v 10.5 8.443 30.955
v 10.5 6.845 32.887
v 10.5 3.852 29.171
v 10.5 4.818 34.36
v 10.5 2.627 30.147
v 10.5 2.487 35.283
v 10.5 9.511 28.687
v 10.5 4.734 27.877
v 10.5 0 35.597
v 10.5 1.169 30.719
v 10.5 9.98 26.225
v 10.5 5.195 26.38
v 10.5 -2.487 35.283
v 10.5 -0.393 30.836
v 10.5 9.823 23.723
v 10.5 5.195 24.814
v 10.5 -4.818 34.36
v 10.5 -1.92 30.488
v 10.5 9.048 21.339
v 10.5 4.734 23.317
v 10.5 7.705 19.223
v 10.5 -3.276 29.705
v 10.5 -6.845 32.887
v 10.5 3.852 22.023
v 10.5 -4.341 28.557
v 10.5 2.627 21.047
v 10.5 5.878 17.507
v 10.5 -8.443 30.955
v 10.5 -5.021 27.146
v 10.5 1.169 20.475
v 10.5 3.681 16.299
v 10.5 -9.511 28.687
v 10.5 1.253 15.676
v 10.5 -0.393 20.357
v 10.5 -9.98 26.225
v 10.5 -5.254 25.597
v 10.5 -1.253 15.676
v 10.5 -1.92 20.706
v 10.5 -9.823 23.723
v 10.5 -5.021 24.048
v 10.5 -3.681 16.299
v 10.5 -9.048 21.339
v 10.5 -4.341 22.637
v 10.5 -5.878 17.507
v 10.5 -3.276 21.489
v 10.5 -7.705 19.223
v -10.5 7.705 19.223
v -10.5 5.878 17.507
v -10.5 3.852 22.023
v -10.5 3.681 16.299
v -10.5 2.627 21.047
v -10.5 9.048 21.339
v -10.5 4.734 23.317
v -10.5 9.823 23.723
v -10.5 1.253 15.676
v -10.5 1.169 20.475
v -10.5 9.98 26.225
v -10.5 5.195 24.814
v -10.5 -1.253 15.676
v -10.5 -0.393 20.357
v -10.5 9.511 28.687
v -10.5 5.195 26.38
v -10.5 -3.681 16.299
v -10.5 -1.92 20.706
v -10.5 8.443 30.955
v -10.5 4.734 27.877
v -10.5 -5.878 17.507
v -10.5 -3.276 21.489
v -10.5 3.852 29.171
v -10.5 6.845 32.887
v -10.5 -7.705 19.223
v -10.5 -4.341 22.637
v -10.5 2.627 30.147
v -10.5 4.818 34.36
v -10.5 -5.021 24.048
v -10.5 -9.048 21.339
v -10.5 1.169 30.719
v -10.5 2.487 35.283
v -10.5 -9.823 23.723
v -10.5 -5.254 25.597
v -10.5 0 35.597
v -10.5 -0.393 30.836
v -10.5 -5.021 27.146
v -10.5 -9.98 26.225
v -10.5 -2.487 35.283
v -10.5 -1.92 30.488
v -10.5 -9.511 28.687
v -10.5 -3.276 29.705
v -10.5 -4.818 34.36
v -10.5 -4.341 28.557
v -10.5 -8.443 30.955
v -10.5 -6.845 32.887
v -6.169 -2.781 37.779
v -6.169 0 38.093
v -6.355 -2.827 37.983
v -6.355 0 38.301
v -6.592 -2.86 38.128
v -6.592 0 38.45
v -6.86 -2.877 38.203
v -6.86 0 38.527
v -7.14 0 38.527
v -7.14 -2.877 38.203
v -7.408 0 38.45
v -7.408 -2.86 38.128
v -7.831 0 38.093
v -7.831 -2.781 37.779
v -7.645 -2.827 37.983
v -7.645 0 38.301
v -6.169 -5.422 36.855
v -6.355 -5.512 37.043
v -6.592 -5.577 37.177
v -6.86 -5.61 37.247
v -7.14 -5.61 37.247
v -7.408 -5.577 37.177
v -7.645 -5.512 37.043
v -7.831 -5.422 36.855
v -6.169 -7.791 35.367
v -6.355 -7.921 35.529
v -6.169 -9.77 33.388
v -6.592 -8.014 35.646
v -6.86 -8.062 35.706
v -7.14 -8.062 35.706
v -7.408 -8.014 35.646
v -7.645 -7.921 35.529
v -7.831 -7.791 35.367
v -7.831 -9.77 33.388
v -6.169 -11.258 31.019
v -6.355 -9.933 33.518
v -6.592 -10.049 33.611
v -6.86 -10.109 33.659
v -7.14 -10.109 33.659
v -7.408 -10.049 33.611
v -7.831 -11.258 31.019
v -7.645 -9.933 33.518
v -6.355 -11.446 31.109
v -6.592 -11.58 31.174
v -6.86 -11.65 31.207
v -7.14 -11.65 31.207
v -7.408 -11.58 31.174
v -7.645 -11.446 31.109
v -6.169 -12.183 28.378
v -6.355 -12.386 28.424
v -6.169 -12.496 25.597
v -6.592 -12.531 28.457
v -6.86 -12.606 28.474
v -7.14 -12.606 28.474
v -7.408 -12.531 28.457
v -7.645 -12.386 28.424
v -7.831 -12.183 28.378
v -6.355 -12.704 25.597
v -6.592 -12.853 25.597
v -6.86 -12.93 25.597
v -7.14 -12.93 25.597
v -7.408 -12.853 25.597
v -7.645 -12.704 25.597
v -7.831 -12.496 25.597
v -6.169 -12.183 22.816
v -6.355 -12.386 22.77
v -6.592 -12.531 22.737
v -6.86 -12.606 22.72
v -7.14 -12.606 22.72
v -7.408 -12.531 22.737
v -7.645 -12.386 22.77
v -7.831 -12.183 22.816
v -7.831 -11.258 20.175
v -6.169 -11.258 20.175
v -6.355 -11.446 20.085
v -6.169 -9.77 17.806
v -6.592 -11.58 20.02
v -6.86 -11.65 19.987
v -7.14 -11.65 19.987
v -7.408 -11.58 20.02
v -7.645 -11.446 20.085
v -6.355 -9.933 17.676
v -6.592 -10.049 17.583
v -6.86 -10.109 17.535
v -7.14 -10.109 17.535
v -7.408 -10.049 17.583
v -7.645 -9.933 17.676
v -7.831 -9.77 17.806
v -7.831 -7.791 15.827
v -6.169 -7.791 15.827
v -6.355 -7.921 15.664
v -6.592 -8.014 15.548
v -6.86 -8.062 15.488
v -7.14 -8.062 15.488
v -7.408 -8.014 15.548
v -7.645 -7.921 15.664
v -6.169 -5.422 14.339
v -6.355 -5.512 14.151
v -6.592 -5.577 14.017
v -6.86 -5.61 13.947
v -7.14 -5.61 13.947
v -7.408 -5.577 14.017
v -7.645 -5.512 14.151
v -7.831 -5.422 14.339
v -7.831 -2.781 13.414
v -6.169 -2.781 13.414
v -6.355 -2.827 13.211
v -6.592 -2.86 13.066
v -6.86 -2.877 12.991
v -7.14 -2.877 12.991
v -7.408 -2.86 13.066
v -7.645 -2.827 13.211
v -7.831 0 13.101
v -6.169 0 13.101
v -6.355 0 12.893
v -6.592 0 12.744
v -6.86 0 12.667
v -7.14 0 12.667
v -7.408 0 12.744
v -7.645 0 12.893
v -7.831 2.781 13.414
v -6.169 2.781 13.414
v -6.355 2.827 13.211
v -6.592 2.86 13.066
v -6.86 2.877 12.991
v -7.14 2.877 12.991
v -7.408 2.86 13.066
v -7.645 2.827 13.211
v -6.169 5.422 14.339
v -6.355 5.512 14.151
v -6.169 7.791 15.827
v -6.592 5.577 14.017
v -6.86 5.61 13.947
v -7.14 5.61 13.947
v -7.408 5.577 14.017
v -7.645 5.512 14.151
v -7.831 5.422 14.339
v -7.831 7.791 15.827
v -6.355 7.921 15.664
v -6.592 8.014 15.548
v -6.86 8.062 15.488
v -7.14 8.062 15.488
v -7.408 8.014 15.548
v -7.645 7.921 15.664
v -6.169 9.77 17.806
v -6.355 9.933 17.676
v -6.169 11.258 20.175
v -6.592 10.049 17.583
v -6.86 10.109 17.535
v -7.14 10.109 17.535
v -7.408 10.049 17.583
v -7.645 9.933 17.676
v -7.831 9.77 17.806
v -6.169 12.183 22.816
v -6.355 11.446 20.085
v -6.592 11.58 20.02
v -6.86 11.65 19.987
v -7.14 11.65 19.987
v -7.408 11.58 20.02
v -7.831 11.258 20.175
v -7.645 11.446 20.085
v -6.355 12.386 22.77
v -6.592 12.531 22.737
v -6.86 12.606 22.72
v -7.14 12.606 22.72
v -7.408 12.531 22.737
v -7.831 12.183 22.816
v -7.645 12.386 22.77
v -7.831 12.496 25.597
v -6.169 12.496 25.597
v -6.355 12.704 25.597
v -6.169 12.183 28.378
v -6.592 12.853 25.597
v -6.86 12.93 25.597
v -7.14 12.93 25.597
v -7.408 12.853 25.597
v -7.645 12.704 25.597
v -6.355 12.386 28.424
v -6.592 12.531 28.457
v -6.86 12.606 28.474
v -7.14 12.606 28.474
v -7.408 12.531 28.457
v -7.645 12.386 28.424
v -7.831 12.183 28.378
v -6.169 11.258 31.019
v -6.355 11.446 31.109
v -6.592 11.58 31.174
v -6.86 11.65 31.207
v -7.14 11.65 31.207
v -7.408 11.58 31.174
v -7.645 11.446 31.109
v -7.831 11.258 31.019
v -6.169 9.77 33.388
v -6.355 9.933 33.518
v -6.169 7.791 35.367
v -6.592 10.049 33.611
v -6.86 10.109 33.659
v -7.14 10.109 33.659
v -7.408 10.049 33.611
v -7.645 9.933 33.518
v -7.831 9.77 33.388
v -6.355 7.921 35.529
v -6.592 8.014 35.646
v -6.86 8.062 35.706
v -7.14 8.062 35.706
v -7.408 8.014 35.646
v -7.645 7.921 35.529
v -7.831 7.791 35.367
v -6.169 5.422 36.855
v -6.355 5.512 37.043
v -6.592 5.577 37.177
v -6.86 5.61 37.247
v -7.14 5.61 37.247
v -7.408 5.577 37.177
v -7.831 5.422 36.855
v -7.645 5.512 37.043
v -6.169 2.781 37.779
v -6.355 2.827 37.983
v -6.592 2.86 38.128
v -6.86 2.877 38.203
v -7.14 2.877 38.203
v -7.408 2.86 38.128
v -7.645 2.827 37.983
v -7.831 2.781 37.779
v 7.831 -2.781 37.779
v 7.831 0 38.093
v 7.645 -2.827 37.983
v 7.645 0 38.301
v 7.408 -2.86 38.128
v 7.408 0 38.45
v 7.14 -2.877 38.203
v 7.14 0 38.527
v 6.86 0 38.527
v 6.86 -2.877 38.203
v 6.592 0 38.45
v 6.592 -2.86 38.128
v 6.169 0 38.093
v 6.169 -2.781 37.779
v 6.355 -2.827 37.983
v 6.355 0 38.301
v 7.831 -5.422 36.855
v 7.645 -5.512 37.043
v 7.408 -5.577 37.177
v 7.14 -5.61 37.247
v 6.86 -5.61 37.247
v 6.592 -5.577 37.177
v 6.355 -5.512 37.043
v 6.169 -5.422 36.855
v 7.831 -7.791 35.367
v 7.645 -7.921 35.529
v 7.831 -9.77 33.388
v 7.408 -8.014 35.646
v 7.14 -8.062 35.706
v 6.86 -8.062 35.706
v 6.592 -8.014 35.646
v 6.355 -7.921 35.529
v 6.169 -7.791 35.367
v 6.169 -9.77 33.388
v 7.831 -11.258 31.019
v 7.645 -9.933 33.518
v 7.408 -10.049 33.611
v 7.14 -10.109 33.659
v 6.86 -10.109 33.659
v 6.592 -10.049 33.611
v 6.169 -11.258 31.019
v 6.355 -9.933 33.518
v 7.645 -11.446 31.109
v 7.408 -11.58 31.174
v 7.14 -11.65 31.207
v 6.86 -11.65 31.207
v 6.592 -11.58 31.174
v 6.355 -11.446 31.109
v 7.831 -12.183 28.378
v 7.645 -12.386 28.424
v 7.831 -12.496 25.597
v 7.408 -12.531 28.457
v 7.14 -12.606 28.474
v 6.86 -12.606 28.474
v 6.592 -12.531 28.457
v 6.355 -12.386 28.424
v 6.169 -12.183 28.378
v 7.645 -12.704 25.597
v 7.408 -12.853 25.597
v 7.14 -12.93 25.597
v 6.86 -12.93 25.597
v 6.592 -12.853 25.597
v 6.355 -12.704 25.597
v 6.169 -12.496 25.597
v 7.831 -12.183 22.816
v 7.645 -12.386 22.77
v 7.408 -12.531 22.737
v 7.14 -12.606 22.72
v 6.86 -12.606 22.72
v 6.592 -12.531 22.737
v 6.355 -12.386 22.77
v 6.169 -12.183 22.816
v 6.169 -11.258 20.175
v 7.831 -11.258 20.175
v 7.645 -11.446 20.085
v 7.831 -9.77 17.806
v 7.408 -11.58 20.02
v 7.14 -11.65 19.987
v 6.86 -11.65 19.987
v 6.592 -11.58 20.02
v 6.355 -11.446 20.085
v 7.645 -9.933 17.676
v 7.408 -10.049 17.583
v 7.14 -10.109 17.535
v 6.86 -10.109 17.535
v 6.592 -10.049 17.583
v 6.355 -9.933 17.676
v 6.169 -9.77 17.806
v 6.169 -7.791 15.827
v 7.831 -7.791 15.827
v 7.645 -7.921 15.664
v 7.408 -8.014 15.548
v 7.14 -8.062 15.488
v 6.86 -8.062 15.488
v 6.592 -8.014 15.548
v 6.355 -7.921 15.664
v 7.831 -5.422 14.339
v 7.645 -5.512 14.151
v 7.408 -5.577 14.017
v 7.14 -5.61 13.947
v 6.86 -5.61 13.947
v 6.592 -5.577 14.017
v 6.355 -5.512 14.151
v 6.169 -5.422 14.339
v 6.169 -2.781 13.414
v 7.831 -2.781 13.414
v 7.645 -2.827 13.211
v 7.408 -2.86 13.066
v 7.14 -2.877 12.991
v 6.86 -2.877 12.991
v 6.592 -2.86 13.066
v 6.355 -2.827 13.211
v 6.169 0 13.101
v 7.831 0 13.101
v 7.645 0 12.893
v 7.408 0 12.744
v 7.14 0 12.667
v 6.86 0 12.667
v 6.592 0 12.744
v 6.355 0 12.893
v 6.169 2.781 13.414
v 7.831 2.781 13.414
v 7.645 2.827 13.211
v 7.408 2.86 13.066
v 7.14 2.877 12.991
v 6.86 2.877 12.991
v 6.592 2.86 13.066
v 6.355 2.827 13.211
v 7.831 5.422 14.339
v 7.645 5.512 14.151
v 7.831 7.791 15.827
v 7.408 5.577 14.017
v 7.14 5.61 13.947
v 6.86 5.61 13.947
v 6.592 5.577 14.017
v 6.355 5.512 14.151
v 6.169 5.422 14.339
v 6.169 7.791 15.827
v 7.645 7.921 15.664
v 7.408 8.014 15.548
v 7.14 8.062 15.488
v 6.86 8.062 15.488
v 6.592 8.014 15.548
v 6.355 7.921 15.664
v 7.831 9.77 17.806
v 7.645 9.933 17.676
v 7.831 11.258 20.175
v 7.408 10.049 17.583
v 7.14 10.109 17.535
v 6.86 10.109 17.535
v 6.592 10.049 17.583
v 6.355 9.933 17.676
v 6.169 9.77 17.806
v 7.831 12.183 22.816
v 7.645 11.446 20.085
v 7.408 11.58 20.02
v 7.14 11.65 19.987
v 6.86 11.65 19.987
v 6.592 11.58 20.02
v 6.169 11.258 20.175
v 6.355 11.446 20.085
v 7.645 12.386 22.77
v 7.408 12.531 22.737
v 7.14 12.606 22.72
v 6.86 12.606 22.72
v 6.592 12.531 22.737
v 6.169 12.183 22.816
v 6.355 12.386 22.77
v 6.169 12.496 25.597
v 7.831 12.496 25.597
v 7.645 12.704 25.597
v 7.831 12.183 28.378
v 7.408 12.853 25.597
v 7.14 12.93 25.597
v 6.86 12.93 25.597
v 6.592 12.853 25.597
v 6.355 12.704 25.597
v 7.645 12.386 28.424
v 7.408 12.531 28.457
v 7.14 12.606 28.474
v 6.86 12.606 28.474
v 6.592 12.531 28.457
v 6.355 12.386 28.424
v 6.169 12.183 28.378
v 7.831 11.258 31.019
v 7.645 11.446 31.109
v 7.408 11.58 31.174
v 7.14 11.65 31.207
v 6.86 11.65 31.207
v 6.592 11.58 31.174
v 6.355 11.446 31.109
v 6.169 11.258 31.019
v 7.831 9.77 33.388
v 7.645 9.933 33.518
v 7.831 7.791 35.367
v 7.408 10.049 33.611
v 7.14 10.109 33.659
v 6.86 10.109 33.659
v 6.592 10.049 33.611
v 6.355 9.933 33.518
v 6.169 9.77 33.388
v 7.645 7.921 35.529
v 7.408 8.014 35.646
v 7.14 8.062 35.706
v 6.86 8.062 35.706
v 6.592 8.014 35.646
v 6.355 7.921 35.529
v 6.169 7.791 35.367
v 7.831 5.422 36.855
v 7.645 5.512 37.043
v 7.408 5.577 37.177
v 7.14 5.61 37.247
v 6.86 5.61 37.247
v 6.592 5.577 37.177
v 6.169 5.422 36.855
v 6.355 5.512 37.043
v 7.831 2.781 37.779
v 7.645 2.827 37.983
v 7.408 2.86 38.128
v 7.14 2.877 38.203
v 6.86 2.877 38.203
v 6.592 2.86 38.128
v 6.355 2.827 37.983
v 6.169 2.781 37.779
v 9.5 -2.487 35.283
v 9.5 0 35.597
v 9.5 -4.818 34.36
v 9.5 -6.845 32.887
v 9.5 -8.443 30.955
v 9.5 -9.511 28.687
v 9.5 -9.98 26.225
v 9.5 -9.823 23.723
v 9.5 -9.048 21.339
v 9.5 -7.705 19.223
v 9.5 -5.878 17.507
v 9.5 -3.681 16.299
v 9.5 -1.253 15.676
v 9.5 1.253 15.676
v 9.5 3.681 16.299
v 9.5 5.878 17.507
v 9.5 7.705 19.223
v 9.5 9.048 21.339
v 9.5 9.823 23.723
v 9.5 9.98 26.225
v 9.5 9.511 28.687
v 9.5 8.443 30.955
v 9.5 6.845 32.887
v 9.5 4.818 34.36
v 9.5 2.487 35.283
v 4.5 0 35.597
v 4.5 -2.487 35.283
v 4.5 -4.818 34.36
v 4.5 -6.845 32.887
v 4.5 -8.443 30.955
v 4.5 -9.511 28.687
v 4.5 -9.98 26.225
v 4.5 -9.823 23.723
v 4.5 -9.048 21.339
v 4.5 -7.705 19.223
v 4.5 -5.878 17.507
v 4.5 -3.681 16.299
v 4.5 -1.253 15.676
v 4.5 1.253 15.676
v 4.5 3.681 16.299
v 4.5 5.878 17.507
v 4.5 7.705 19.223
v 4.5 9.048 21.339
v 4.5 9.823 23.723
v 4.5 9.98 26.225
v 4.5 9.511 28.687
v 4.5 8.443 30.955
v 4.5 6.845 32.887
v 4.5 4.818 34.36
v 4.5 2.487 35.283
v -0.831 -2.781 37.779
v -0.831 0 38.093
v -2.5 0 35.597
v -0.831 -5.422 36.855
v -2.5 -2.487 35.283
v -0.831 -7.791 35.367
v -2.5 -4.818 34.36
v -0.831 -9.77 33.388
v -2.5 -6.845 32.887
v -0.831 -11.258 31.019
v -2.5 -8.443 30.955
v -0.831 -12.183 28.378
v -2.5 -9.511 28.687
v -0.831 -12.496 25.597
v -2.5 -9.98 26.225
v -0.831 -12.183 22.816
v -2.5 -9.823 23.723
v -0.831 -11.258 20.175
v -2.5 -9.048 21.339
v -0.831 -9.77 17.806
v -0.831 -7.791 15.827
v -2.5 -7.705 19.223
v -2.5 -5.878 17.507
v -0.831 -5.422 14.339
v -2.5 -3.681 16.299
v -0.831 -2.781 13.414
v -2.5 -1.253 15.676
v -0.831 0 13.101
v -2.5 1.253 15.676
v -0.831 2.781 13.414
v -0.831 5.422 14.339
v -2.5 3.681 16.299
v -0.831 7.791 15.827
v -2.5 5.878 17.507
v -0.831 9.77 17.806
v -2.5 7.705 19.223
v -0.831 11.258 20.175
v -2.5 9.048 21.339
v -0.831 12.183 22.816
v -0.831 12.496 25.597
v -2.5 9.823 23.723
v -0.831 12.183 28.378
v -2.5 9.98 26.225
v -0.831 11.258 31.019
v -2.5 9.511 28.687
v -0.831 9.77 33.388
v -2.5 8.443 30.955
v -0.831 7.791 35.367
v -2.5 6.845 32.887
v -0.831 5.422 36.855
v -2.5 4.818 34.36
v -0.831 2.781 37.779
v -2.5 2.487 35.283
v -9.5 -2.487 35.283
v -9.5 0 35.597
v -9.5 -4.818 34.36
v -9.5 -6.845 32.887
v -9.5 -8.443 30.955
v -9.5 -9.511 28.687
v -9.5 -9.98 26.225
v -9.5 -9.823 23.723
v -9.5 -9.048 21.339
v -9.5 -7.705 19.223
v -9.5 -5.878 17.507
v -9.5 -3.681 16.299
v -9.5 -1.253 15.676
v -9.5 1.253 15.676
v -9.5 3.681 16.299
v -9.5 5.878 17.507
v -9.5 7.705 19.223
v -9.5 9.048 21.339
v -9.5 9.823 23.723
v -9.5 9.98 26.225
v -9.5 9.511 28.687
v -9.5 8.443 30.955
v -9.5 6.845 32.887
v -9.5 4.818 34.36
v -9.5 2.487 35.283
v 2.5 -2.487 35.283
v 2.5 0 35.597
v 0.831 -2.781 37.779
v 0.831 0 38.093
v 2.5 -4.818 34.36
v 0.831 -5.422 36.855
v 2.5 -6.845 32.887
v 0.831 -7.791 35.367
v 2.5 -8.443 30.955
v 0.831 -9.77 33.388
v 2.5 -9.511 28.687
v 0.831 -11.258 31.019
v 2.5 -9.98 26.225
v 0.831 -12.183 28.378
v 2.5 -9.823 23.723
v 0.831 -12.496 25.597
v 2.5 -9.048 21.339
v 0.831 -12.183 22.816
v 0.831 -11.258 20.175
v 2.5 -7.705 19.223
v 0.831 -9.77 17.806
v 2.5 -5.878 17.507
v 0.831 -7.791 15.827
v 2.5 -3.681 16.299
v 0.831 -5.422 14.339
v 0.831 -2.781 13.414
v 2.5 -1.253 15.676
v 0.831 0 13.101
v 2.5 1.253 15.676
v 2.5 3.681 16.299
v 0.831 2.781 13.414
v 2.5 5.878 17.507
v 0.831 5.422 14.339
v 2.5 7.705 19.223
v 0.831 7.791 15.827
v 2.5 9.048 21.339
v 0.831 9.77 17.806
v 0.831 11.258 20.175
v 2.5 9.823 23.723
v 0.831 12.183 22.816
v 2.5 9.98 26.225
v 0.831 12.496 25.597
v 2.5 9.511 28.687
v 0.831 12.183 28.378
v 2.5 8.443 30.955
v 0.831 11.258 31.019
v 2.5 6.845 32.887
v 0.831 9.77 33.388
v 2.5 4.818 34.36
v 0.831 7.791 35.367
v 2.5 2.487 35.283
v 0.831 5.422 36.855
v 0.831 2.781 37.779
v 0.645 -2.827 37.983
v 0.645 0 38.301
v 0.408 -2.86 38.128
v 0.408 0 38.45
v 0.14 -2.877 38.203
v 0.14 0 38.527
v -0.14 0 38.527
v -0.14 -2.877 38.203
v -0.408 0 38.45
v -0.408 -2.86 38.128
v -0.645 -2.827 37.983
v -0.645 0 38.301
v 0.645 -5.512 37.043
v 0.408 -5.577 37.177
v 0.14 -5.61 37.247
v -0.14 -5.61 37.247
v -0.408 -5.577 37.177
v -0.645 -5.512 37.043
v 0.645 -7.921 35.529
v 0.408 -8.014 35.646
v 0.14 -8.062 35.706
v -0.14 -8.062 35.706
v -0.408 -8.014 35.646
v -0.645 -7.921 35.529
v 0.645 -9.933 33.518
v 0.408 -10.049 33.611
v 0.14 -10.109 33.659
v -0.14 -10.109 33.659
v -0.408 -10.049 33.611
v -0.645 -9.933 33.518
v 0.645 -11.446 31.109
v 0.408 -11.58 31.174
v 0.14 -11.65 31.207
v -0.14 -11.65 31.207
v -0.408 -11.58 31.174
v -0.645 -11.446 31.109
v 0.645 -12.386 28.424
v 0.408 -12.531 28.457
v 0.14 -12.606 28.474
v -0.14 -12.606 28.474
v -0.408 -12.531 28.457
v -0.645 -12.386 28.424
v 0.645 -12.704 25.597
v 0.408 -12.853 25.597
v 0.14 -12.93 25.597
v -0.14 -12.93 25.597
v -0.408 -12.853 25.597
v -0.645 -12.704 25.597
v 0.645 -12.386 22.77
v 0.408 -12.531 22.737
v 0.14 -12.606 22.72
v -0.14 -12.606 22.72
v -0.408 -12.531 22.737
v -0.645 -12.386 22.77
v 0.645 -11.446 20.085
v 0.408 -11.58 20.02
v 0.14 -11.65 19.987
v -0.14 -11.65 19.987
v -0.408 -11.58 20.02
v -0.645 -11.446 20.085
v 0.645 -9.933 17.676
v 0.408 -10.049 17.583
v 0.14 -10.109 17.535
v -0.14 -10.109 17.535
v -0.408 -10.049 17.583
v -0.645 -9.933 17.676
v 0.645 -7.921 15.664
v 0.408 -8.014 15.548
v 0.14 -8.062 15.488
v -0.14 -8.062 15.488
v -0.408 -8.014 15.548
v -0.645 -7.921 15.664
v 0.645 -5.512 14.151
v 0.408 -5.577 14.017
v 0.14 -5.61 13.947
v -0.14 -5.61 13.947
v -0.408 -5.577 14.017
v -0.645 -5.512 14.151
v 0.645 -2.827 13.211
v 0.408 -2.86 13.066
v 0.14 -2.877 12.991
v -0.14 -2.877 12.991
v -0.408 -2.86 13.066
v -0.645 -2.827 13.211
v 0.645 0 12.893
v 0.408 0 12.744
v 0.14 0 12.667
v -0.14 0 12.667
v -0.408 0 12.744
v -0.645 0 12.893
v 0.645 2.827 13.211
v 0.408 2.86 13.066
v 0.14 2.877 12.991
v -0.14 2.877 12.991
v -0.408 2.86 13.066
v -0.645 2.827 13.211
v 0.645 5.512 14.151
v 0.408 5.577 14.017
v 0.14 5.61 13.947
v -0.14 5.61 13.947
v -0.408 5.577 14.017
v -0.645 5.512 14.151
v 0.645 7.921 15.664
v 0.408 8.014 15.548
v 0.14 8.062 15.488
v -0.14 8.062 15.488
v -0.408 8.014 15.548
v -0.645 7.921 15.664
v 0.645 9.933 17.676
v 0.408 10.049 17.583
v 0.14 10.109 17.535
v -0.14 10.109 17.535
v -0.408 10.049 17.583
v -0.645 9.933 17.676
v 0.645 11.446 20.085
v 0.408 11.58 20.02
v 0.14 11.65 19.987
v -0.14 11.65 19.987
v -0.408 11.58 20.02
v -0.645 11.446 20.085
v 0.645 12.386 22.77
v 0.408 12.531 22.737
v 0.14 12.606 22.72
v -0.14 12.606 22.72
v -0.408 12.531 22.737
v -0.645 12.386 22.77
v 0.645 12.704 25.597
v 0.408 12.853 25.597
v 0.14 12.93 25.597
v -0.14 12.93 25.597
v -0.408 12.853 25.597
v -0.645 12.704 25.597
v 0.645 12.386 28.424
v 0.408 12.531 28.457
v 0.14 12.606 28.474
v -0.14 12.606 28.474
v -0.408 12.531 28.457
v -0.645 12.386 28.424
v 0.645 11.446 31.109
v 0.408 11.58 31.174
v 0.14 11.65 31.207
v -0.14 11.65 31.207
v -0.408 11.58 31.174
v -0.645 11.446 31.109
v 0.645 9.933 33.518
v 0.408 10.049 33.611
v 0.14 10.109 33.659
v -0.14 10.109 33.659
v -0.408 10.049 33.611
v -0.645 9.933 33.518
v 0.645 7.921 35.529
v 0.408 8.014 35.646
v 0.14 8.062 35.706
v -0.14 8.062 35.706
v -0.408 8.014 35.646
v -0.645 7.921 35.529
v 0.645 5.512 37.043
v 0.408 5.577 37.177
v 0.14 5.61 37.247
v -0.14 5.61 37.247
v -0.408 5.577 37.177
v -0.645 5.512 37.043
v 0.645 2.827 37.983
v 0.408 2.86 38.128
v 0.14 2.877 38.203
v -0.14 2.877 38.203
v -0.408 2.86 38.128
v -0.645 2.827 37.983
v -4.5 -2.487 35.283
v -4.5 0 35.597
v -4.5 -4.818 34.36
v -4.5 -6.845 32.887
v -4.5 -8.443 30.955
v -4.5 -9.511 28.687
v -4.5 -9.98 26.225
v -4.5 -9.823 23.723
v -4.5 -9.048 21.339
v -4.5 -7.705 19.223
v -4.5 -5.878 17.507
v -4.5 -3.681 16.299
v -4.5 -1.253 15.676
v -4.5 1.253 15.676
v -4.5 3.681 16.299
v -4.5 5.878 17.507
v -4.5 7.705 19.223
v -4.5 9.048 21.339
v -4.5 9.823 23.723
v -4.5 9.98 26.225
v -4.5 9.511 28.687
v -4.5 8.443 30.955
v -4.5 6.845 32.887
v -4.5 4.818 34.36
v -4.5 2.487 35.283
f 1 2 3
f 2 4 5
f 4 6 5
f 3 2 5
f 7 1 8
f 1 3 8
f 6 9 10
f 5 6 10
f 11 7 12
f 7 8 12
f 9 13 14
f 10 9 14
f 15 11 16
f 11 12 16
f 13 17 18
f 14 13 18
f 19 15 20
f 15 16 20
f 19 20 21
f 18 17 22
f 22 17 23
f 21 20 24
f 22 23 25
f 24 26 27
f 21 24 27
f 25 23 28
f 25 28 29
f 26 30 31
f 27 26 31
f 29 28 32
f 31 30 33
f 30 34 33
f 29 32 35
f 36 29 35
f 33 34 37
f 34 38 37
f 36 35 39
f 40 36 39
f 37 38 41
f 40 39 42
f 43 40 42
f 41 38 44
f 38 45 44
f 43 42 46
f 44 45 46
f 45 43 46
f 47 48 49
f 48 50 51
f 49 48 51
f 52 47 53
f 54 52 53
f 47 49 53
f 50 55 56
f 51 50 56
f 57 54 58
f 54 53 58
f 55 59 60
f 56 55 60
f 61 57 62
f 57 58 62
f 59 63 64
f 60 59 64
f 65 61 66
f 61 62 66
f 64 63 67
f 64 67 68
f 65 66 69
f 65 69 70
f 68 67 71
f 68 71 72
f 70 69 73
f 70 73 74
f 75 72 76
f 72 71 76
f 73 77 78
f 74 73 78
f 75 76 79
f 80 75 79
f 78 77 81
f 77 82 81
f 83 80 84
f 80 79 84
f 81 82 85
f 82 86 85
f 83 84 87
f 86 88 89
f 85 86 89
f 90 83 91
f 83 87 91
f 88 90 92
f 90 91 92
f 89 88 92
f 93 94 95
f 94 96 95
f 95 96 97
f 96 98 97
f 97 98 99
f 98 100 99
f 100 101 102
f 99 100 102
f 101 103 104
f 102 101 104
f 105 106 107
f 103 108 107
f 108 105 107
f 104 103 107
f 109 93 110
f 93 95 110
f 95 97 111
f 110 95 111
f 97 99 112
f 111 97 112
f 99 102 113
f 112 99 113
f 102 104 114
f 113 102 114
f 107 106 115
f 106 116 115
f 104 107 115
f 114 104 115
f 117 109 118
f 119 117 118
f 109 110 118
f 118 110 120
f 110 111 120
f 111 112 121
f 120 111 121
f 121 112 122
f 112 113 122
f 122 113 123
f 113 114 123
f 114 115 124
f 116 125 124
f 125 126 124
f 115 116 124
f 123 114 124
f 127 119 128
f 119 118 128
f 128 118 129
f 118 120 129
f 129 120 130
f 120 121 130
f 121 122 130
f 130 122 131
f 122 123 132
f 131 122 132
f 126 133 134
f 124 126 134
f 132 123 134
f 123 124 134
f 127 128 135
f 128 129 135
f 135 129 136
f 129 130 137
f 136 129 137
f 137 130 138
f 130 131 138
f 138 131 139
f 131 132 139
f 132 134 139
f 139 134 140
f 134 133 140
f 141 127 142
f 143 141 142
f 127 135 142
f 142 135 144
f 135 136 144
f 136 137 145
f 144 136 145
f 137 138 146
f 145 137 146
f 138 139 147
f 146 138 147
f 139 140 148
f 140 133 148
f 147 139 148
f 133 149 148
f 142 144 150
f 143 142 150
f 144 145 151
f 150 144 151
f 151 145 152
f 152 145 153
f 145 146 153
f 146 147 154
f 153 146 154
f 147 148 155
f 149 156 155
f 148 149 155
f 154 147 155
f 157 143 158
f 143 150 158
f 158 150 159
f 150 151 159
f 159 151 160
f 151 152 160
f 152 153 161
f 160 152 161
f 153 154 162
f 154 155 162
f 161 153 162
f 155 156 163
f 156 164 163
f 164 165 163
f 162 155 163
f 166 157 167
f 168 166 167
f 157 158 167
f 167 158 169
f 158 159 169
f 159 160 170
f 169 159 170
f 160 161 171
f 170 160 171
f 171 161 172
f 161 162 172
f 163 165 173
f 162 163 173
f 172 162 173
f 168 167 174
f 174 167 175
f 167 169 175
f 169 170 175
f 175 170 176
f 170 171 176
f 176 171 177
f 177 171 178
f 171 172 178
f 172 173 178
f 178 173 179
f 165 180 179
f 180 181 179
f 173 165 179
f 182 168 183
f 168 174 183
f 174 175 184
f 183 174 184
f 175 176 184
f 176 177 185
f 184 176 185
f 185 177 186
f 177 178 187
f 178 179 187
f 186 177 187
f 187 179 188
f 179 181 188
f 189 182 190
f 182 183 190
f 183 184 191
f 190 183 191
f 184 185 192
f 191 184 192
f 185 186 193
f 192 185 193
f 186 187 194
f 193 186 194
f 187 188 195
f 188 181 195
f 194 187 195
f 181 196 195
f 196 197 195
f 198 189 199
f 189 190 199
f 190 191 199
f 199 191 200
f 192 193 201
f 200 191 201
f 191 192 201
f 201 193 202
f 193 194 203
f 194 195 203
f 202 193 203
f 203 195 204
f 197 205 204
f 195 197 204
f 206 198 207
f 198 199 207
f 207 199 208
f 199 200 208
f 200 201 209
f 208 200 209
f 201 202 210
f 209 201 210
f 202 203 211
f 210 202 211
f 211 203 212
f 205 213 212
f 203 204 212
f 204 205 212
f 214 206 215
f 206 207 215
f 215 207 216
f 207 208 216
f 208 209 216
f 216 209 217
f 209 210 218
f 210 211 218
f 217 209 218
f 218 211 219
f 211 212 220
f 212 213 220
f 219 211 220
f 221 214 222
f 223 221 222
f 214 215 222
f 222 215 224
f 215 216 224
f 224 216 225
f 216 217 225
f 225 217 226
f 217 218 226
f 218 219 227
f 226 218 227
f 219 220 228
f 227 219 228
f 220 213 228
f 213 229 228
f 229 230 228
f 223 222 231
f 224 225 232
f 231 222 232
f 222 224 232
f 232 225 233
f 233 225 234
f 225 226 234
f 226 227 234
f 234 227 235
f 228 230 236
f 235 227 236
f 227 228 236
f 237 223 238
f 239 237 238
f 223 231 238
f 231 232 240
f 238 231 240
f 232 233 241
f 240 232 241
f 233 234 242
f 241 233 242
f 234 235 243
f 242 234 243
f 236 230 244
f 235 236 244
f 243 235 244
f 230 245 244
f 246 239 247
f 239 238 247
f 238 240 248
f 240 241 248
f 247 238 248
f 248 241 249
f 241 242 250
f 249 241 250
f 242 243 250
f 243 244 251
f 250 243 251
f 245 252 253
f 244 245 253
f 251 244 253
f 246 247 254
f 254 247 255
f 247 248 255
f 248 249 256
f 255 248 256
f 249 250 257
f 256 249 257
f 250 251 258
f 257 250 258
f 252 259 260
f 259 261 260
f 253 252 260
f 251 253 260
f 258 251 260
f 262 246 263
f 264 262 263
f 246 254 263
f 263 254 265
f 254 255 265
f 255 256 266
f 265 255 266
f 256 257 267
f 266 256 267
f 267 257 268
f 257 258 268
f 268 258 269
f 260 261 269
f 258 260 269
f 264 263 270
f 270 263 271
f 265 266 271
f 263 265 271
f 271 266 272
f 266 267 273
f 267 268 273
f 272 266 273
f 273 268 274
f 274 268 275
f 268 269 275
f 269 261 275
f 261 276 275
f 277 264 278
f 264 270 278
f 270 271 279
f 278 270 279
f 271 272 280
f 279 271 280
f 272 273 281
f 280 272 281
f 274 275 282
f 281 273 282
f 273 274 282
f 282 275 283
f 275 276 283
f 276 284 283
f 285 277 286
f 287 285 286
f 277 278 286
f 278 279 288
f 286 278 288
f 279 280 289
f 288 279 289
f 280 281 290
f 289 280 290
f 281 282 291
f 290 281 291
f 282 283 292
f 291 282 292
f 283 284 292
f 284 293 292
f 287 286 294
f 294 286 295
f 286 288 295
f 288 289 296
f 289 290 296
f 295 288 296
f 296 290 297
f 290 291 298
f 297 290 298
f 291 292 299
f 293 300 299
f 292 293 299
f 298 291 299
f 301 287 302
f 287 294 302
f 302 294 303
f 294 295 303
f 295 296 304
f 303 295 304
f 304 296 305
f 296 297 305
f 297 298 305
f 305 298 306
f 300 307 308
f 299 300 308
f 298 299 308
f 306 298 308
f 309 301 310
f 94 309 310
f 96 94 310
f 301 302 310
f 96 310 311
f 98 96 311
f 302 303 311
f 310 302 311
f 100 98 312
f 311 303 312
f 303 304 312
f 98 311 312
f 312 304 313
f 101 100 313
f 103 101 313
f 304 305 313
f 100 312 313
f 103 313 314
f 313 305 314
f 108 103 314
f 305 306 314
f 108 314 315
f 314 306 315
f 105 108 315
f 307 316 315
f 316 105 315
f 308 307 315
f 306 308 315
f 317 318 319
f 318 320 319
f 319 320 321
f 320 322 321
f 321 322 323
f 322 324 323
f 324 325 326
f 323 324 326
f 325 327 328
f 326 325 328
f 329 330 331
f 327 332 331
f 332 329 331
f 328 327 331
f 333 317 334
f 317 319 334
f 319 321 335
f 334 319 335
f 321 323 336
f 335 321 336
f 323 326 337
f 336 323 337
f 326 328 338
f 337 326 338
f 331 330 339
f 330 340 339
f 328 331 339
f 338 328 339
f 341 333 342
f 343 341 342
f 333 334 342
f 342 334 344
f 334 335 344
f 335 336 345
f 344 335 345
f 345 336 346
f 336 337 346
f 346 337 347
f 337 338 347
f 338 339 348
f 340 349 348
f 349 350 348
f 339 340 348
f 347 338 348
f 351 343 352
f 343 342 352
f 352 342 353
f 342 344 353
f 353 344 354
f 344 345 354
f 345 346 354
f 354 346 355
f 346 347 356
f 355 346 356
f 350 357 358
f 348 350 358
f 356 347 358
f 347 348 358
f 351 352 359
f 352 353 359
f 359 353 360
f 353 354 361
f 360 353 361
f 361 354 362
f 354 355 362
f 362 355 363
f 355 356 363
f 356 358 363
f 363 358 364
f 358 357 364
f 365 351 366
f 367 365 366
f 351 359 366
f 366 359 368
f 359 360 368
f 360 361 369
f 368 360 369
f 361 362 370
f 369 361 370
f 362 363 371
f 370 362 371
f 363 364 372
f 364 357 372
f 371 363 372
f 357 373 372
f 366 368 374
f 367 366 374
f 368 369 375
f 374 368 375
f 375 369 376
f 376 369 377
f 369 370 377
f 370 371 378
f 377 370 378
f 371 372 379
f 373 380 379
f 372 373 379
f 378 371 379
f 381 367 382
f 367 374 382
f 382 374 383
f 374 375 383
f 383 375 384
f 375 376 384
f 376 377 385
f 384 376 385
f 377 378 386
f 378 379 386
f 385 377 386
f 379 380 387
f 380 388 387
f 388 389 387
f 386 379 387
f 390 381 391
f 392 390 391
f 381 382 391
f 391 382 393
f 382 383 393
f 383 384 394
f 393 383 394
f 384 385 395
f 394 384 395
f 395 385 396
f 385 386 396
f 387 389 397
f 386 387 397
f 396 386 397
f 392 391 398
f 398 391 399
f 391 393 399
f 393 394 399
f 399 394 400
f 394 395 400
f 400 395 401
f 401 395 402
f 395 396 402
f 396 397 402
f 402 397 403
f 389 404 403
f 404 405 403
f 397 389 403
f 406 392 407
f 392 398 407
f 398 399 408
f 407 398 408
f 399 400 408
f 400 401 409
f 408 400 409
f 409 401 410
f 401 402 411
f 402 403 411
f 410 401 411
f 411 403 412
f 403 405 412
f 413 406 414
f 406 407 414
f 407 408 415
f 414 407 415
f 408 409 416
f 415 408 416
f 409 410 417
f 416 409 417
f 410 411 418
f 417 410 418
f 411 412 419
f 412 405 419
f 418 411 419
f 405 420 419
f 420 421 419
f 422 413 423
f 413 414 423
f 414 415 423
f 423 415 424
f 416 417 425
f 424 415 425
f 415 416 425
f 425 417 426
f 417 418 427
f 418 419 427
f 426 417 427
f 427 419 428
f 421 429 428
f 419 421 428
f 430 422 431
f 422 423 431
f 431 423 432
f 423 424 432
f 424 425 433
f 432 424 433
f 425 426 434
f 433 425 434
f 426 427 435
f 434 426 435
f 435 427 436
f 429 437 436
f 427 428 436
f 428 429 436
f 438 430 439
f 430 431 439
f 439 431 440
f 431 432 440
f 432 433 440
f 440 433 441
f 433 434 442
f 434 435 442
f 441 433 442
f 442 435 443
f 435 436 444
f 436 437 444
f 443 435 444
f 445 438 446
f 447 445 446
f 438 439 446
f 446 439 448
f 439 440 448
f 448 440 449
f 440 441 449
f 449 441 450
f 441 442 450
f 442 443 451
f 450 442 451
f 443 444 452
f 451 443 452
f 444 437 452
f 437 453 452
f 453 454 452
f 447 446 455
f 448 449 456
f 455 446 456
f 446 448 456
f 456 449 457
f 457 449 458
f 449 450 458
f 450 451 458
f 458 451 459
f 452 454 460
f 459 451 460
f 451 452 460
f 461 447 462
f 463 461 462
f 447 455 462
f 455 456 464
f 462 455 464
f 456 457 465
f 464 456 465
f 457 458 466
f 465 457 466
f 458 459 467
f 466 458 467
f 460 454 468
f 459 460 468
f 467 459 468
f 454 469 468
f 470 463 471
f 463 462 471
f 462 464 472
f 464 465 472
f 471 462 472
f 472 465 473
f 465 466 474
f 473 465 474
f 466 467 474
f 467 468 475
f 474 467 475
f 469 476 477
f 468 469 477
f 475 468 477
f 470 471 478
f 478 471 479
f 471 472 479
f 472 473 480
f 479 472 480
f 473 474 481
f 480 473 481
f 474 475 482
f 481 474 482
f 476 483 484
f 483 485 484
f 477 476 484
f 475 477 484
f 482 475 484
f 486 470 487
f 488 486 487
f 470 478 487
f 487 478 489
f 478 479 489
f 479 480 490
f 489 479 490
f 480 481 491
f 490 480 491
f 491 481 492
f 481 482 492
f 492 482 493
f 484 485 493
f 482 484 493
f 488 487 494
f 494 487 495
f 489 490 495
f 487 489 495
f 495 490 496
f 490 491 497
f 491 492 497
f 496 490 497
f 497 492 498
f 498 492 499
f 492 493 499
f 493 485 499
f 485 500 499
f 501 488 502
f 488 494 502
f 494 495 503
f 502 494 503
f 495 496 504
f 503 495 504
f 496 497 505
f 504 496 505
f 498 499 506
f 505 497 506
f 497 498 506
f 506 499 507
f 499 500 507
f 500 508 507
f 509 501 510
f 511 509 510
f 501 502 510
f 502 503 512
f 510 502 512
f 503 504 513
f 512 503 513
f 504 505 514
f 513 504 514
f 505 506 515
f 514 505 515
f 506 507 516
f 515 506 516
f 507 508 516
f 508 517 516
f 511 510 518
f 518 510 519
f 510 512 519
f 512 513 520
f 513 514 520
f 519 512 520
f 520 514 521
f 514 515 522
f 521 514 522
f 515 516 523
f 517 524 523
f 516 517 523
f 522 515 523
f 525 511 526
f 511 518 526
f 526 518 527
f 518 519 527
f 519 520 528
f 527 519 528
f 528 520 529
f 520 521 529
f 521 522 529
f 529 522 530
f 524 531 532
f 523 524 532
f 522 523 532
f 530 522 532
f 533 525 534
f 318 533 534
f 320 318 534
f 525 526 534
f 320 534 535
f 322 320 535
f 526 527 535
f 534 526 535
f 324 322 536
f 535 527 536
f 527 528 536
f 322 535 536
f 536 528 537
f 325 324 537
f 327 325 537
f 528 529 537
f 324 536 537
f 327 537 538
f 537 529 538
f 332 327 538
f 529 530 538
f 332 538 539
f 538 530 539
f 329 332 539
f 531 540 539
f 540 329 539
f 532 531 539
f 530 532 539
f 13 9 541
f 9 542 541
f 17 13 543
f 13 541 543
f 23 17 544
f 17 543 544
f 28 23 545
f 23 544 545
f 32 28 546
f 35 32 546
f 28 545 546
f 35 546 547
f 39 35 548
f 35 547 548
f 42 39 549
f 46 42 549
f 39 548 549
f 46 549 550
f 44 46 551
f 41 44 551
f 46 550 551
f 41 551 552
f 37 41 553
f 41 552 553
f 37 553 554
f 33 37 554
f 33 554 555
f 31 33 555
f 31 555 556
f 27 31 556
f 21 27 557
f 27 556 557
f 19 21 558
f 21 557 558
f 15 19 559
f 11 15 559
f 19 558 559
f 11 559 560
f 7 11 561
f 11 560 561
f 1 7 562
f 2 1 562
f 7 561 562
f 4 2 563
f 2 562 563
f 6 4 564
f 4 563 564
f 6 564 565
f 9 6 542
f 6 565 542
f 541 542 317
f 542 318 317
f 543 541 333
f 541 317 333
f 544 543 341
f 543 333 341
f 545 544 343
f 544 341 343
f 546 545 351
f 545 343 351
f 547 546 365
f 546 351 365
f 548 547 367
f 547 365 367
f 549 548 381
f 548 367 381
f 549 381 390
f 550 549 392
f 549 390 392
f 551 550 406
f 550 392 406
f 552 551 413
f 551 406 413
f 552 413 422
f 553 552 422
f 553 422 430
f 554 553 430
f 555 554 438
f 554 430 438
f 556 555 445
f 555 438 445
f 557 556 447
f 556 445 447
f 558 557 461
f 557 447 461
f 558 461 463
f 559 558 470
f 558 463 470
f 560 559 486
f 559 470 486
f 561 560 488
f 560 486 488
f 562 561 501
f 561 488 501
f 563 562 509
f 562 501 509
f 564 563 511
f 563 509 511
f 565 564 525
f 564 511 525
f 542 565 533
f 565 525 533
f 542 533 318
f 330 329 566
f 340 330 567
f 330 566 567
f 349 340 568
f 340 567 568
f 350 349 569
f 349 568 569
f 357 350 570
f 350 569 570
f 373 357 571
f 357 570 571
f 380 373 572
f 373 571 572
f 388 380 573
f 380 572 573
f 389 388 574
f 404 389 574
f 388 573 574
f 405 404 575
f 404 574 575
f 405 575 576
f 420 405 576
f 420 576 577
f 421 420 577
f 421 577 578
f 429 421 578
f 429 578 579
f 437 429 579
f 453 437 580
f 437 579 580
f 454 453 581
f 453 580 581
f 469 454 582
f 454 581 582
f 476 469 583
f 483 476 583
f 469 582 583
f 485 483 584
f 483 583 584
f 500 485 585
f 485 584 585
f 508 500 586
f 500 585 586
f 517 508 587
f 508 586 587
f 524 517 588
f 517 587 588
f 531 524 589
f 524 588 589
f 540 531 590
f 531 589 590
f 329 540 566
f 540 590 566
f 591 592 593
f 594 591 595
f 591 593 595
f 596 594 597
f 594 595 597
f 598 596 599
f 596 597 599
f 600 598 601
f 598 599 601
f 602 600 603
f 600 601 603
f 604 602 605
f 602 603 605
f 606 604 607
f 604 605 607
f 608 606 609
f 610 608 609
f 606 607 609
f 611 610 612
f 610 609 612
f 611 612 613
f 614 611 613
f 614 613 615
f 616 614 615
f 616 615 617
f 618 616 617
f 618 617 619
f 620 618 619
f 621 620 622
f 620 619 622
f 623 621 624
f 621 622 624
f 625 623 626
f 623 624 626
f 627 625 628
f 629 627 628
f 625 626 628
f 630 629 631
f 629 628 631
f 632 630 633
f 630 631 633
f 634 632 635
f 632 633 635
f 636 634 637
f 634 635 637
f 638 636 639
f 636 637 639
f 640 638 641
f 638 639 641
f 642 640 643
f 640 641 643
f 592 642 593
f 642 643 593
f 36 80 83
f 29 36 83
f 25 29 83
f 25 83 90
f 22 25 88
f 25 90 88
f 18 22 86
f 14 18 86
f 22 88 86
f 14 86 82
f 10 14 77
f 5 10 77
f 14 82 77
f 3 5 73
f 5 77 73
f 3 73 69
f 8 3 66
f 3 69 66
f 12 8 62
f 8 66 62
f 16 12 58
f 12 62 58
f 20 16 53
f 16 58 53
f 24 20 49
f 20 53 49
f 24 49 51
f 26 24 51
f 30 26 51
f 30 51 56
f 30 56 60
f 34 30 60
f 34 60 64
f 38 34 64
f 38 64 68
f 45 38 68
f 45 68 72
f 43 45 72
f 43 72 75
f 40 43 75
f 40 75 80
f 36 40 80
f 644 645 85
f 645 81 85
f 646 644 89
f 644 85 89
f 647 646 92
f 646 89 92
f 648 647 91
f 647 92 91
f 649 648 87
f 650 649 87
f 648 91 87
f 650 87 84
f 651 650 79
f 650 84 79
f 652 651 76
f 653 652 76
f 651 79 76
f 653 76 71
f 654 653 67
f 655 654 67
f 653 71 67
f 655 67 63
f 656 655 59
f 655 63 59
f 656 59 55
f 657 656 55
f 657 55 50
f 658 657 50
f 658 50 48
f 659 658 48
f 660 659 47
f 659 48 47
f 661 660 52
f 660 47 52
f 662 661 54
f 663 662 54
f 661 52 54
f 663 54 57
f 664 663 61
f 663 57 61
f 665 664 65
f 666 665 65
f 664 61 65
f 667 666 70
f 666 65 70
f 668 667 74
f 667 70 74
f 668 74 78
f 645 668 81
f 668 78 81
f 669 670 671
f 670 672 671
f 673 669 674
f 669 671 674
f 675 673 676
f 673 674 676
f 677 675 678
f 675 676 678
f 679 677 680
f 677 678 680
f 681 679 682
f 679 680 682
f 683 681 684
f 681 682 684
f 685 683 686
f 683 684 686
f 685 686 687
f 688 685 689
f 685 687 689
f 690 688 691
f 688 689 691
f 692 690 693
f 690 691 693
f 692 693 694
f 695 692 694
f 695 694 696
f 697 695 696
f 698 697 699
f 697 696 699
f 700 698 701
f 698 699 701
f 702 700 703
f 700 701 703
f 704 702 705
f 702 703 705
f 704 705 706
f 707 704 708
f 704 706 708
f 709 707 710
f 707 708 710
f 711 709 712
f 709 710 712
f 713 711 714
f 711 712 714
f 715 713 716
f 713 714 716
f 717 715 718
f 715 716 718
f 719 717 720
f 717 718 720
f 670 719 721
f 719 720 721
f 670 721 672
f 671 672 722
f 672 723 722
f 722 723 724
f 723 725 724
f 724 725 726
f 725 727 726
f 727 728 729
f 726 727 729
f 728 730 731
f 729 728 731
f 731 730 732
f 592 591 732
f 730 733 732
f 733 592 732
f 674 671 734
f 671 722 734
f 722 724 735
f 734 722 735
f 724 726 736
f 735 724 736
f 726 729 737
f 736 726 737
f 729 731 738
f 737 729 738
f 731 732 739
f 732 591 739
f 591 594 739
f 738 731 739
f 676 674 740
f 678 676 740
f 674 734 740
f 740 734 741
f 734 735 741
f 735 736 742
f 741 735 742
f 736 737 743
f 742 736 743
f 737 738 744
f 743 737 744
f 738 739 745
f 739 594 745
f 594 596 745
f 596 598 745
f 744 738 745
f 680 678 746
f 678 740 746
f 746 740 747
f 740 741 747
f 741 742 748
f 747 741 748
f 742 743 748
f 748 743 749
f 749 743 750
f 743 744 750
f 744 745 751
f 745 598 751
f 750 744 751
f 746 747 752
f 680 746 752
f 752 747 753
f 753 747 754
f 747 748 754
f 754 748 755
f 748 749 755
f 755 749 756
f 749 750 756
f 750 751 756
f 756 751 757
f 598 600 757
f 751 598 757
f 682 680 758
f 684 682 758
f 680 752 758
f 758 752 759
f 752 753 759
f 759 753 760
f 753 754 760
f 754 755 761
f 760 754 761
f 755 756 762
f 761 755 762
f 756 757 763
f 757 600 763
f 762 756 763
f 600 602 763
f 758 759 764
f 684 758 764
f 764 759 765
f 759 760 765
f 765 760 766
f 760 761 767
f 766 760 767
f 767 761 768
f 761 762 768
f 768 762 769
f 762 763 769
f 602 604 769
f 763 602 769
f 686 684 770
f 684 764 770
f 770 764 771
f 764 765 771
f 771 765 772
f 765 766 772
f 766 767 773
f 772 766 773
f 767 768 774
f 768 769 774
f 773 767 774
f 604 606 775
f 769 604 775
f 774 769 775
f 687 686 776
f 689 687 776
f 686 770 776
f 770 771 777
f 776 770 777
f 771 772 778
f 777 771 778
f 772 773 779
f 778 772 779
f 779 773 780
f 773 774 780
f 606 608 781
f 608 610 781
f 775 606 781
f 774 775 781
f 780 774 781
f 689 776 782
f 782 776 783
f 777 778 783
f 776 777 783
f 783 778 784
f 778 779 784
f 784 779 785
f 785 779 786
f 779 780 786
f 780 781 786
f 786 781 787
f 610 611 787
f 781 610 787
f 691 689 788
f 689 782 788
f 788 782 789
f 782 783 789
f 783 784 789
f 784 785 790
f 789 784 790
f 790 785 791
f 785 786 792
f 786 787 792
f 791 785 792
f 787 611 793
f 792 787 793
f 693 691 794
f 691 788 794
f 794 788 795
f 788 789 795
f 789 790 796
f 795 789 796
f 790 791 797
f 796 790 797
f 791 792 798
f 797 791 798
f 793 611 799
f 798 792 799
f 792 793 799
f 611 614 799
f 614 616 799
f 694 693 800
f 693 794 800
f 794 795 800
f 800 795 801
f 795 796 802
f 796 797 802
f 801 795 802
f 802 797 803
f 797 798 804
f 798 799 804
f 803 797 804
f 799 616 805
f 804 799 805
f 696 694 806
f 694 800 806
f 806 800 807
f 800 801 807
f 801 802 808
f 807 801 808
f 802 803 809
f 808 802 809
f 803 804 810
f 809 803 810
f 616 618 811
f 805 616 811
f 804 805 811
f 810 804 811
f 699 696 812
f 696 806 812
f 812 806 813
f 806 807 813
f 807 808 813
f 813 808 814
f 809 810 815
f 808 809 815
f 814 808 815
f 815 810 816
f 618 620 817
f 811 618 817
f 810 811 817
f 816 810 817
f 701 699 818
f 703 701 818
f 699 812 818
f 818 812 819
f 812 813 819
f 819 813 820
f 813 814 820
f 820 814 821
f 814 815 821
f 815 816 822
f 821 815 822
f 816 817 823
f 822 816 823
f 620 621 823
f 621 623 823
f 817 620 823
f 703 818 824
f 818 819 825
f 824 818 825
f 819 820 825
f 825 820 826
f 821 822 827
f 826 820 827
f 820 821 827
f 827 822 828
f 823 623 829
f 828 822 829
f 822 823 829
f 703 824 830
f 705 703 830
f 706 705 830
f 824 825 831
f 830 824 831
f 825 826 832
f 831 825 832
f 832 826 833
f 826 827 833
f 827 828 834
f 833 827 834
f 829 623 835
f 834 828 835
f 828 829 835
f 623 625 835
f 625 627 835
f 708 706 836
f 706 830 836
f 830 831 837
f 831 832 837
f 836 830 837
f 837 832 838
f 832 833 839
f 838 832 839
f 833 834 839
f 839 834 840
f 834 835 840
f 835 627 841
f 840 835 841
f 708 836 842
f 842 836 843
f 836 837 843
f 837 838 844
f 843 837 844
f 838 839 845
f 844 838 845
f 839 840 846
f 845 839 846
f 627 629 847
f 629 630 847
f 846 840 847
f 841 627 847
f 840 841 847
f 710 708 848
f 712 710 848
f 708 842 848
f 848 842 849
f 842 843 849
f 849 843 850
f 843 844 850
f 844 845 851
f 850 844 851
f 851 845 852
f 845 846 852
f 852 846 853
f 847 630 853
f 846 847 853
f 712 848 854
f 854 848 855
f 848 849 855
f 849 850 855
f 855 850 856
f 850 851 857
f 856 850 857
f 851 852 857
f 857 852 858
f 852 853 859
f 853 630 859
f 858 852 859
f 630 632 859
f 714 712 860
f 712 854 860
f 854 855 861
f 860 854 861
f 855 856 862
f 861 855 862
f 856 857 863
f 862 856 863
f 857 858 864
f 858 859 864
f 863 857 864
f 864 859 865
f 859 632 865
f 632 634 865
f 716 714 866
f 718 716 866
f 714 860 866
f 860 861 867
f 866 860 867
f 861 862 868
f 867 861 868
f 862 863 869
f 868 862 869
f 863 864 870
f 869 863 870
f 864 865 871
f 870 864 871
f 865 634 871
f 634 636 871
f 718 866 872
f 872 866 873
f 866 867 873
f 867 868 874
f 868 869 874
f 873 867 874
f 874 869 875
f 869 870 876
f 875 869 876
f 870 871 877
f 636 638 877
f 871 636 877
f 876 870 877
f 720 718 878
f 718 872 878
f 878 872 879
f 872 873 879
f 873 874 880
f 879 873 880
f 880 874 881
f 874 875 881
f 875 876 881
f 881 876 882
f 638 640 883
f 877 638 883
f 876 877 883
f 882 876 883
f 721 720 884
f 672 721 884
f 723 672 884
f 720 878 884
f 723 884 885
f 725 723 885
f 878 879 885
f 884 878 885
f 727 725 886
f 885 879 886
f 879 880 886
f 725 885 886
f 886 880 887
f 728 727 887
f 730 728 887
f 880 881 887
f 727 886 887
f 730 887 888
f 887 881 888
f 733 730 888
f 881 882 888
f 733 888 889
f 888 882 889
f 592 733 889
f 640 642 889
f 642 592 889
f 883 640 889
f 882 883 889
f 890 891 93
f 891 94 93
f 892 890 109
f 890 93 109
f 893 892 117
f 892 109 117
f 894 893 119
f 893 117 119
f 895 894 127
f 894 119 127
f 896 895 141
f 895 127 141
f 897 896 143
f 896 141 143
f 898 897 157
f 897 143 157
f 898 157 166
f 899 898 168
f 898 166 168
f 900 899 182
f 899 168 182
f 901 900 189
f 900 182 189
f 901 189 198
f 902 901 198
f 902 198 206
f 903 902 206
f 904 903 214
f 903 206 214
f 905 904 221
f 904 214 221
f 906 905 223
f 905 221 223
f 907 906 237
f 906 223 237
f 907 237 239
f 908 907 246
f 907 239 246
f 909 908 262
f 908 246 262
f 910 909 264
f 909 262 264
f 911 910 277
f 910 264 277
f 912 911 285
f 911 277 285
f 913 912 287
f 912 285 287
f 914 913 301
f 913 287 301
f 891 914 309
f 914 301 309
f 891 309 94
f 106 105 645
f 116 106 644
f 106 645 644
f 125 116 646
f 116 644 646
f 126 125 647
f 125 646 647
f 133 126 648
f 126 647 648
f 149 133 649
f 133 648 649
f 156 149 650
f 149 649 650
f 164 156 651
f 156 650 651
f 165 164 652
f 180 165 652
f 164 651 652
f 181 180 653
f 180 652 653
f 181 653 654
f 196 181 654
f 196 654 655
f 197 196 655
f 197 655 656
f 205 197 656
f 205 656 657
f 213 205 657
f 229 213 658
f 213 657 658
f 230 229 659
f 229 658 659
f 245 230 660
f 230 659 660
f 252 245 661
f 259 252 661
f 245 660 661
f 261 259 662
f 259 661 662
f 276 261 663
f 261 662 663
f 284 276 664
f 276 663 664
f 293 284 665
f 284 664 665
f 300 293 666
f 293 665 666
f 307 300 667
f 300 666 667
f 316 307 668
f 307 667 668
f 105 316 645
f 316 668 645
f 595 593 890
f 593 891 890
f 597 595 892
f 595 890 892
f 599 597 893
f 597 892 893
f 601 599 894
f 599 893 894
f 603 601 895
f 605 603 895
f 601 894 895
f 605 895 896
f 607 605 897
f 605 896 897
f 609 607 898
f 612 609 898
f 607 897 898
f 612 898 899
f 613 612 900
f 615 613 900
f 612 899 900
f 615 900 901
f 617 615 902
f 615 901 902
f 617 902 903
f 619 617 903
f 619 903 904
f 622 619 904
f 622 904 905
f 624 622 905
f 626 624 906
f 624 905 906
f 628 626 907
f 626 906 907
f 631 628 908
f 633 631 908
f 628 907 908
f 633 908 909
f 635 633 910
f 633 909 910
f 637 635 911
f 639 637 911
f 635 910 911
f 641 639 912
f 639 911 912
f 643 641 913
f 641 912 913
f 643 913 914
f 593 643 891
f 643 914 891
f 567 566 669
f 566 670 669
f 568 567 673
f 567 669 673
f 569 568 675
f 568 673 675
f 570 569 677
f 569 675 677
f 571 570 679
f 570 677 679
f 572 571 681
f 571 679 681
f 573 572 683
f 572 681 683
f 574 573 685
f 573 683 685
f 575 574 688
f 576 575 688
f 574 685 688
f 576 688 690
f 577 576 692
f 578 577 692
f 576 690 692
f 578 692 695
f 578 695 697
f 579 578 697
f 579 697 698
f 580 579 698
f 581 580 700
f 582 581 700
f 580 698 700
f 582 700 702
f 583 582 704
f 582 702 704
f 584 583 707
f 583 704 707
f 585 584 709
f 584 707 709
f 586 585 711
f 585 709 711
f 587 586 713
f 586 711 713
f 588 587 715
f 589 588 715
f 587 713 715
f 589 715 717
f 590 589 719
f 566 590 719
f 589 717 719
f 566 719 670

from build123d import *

# Parameters (mm, degrees)
F2_R     = 5.254137
F3_DEPTH = 21.001


with BuildPart() as f1:
    # F0 (on Front) → F1 (revolve)
    with BuildSketch(Plane.XZ):
        with BuildLine():
            Line((-10.5, 35.596944), (-10.5, 25.596944))
            Line((-10.5, 25.596944), (10.5, 25.596944))
            Line((10.5, 25.596944), (10.5, 35.596944))
            Line((10.5, 35.596944), (9.5, 35.596944))
            Line((9.5, 35.596944), (7.831313, 38.092791))
            ThreePointArc((7.831313, 38.092791), (7, 38.536987), (6.168687, 38.092791))
            Line((6.168687, 38.092791), (4.5, 35.596944))
            Line((4.5, 35.596944), (2.5, 35.596944))
            Line((2.5, 35.596944), (0.831313, 38.092791))
            ThreePointArc((0.831313, 38.092791), (0, 38.536987), (-0.831313, 38.092791))
            Line((-0.831313, 38.092791), (-2.5, 35.596944))
            Line((-2.5, 35.596944), (-4.5, 35.596944))
            Line((-4.5, 35.596944), (-6.168687, 38.092791))
            ThreePointArc((-6.168687, 38.092791), (-7, 38.536987), (-7.831313, 38.092791))
            Line((-7.831313, 38.092791), (-9.5, 35.596944))
            Line((-9.5, 35.596944), (-10.5, 35.596944))
        make_face()
    revolve(axis=Axis((0, 0, 25.596944), (1, 0, 0)))

    # F2 (on face) → F3 (cut, through all)
    with BuildSketch(Plane(origin=(-10.5, 0, 0), x_dir=(0, -1, 0), z_dir=(-1, 0, 0))):
        with Locations((0, 25.596944)):
            Circle(F2_R)
    extrude(amount=-F3_DEPTH, mode=Mode.SUBTRACT)


solid = f1.part
